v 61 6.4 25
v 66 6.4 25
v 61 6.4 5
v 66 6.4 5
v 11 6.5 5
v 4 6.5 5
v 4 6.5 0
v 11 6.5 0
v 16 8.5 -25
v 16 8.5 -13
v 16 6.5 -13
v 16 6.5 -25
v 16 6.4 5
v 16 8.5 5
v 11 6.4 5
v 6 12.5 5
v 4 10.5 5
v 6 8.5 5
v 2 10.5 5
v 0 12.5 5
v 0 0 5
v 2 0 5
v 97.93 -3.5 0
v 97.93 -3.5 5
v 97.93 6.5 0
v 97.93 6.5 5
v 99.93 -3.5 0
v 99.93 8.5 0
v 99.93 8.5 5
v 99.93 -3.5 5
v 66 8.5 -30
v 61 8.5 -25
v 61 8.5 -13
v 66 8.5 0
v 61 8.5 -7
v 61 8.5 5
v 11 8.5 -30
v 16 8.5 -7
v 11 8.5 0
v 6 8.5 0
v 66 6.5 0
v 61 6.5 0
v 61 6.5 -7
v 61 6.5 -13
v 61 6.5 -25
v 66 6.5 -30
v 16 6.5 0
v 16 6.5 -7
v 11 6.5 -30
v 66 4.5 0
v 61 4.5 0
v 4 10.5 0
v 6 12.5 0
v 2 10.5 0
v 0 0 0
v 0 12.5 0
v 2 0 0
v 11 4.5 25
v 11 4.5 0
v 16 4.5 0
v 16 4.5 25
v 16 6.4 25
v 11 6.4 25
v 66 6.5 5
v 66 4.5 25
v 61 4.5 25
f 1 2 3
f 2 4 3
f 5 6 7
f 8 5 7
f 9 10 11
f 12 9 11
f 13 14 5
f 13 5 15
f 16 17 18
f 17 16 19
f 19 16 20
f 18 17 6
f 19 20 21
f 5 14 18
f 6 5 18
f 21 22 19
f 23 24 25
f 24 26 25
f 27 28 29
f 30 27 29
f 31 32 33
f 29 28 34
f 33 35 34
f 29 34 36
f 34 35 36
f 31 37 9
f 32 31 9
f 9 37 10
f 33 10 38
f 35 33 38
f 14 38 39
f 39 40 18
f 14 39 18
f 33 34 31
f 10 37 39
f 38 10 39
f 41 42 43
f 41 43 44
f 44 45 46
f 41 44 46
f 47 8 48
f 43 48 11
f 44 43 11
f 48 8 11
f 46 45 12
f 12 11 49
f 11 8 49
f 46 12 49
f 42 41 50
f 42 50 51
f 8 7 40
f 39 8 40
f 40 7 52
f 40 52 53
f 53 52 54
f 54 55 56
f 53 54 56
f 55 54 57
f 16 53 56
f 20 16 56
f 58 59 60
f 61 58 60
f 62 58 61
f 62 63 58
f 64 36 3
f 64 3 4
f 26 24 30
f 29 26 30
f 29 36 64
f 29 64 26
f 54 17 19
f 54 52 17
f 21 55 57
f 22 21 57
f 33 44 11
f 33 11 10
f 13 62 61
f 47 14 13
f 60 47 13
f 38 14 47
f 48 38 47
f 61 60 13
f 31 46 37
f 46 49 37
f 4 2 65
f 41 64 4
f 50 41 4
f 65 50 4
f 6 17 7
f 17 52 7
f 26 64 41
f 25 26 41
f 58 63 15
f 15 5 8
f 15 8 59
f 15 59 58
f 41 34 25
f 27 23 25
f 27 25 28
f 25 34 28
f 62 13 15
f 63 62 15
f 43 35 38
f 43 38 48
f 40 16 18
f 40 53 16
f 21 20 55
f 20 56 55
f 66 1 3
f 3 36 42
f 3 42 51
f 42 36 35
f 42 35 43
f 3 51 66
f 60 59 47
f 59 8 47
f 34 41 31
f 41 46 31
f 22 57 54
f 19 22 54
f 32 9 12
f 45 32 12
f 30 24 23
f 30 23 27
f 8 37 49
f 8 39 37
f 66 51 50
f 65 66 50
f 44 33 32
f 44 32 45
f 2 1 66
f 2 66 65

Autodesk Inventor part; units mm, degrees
ref_plane "YZ Plane" through (0, 0, 0) normal (1, 0, 0) x (0, 1, 0)
ref_plane "XZ Plane" through (0, 0, 0) normal (0, 1, 0) x (-1, 0, 0)
ref_plane "XY Plane" through (0, 0, 0) normal (0, 0, 1) x (1, 0, 0)
sketch "Sketch1" plane through (0, 0, 0) normal (0, 0, 1) x (1, 0, 0)
  line L0 (0, 0) -> (2, 0)
  line L1 (2, 0) -> (2, 12.5)
  line L2 (2, 12.5) -> (0, 12.5)
  line L3 (0, 12.5) -> (0, 0)
  line L4 (2, 12.5) -> (6, 12.5)
  line L5 (6, 12.5) -> (6, 10.5)
  line L6 (6, 10.5) -> (2, 10.5)
  line L7 (2, 10.5) -> (2, 12.5)
  line L8 (6, 10.5) -> (4, 10.5)
  line L9 (4, 10.5) -> (4, 6.5)
  line L10 (4, 6.5) -> (6, 6.5)
  line L11 (6, 6.5) -> (6, 10.5)
  dimension "d0" = 2
  dimension "d1" = 12.5
  dimension "d2" = 4
  dimension "d3" = 2
  dimension "d4" = 2
  dimension "d5" = 4
extrude "Extrusion1" add sketch "Sketch1" along normal blind 5
sketch "Sketch2" plane through (6, 6.5, 0) normal (1, 0, 0) x (0, 0, -1)
  line L0 (-5, 4) -> (-5, 0) projected
  line L1 (0, 0) -> (0, 4) projected
  line L2 (-5, 0) -> (0, 0)
  line L3 (0, 0) -> (0, 2)
  line L4 (0, 2) -> (-5, 2)
  line L5 (-5, 2) -> (-5, 0)
  point P0 (0, -6.5)
  dimension "d8" = 2
extrude "Extrusion2" add sketch "Sketch2" along normal blind 10
sketch "Sketch3" plane through (0, 0, 0) normal (0, 0, -1) x (-1, 0, 0)
  line L0 (-16, 6.5) -> (-4, 6.5) projected
  line L1 (-16, 8.5) -> (-16, 6.5) projected
  line L2 (-16, 8.5) -> (-11, 8.5)
  line L3 (-11, 8.5) -> (-11, 6.5)
  line L4 (-11, 6.5) -> (-16, 6.5)
  line L5 (-16, 6.5) -> (-16, 8.5)
extrude "Extrusion3" add sketch "Sketch3" along normal blind 30
sketch "Sketch4" plane through (16, 6.5, 0) normal (1, 0, 0) x (0, 0, -1)
  line L0 (-5, 0) -> (30, 0) projected
  line L1 (30, 0) -> (30, 2) projected
  line L2 (30, 2) -> (25, 2)
  line L3 (25, 2) -> (25, 0)
  line L4 (25, 0) -> (30, 0)
  line L5 (30, 0) -> (30, 2)
  point P0 (0, -6.5)
  dimension "d13" = 5
extrude "Extrusion4" add sketch "Sketch4" along normal blind 50
sketch "Sketch5" plane through (16, 6.5, -25) normal (0, 0, 1) x (1, 0, 0)
  line L0 (-5, 0) -> (50, 0) projected
  line L1 (50, 2) -> (45, 2)
  line L2 (45, 2) -> (45, 0)
  line L3 (45, 0) -> (50, 0)
  line L4 (50, 0) -> (50, 2)
  point P0 (-16, -6.5)
  dimension "d16" = 5
extrude "Extrusion5" add sketch "Sketch5" along normal blind 30
sketch "Sketch6" plane through (66, 6.5, 0) normal (1, 0, 0) x (0, 0, -1)
  line L0 (0, 0) -> (-5, 0) projected
  line L1 (-5, 2) -> (0, 2)
  line L2 (0, 2) -> (0, 0)
  line L3 (0, 0) -> (-5, 0)
  line L4 (-5, 0) -> (-5, 2)
  point P0 (0, -6.5)
extrude "Extrusion6" add sketch "Sketch6" along normal blind 29.93
sketch "Sketch7" plane through (95.93, 6.5, 0) normal (1, 0, 0) x (0, 0, -1)
  line L0 (0, 0) -> (0, 2) projected
  line L1 (0, 2) -> (-5, 2) projected
  line L2 (-5, 2) -> (-5, 0) projected
  line L3 (-5, 0) -> (0, 0) projected
  point P0 (0, -6.5)
extrude "Extrusion7" add sketch "Sketch7" along normal blind 4
sketch "Sketch8" plane through (4, 6.5, 0) normal (0, -1, 0) x (1, 0, 0)
  line L0 (62, 0) -> (95.93, 0) projected
  line L1 (57, 5) -> (95.93, 5) projected
  line L2 (95.93, 5) -> (93.93, 5)
  line L3 (93.93, 5) -> (93.93, 0)
  line L4 (93.93, 0) -> (95.93, 0)
  line L5 (95.93, 0) -> (95.93, 5)
  point P0 (-4, 0)
  dimension "d23" = 2
extrude "Extrusion8" add sketch "Sketch8" along normal blind 10
sketch "Sketch9" plane through (4, 6.5, 0) normal (0, -1, 0) x (1, 0, 0)
  line L0 (57, 5) -> (95.93, 5) projected
  line L1 (62, 0) -> (95.93, 0) projected
  line L2 (57, 5) -> (62, 5)
  line L3 (62, 5) -> (62, 0)
  line L4 (62, 0) -> (57, 0)
  line L5 (57, 0) -> (57, 5)
  line L6 (12, 5) -> (7, 5)
  line L7 (7, 5) -> (7, 0)
  line L8 (7, 0) -> (12, 0)
  line L9 (12, 0) -> (12, 5)
  line L10 (7, 5) -> (12, 5)
  line L11 (12, 5) -> (12, 0)
  line L12 (12, 0) -> (7, 0)
  line L13 (7, 0) -> (7, 5)
  line L14 (57, 5) -> (62, 5)
  line L15 (62, 5) -> (62, 0)
  line L16 (62, 0) -> (57, 0)
  line L17 (57, 0) -> (57, 5)
  point P0 (-4, 0)
extrude "Extrusion9" add sketch "Sketch9" along normal blind 2
sketch "Sketch10" plane through (0, 0, 5) normal (0, 0, 1) x (1, 0, 0)
  line L0 (16, 8.5) -> (16, 4.5) projected
  line L1 (11, 4.5) -> (16, 4.5)
  line L2 (16, 4.5) -> (16, 6.4)
  line L3 (16, 6.4) -> (11, 6.4)
  line L4 (11, 6.4) -> (11, 4.5)
  dimension "d28" = 1.9
extrude "Extrusion10" add sketch "Sketch10" along normal blind 20
sketch "Sketch11" plane through (16, 6.5, 5) normal (0, 0, 1) x (1, 0, 0)
  line L0 (50, 0) -> (50, -2) projected
  line L1 (45, -2) -> (50, -2)
  line L2 (50, -2) -> (50, -0.1)
  line L3 (50, -0.1) -> (45, -0.1)
  line L4 (45, -0.1) -> (45, -2)
  point P0 (-16, -6.5)
  dimension "d31" = 1.9
extrude "Extrusion11" add sketch "Sketch11" along normal blind 20
sketch "Sketch12" plane through (61, 6.5, -25) normal (-1, 0, 0) x (0, 0, 1)
  line L0 (0, 0) -> (25, 0) projected
  line L1 (30, 2) -> (30, -0.1) projected
  line L2 (0, 2) -> (30, 2) projected
  line L3 (12, 2) -> (18, 2)
  line L4 (18, 2) -> (18, 0)
  line L5 (18, 0) -> (12, 0)
  line L6 (12, 0) -> (12, 2)
  point P0 (25, -6.5)
  dimension "d34" = 6
  dimension "d35" = 12
extrude "Extrusion12" add sketch "Sketch12" along normal up to next
properties part number "Steunbalk boven bocht"
